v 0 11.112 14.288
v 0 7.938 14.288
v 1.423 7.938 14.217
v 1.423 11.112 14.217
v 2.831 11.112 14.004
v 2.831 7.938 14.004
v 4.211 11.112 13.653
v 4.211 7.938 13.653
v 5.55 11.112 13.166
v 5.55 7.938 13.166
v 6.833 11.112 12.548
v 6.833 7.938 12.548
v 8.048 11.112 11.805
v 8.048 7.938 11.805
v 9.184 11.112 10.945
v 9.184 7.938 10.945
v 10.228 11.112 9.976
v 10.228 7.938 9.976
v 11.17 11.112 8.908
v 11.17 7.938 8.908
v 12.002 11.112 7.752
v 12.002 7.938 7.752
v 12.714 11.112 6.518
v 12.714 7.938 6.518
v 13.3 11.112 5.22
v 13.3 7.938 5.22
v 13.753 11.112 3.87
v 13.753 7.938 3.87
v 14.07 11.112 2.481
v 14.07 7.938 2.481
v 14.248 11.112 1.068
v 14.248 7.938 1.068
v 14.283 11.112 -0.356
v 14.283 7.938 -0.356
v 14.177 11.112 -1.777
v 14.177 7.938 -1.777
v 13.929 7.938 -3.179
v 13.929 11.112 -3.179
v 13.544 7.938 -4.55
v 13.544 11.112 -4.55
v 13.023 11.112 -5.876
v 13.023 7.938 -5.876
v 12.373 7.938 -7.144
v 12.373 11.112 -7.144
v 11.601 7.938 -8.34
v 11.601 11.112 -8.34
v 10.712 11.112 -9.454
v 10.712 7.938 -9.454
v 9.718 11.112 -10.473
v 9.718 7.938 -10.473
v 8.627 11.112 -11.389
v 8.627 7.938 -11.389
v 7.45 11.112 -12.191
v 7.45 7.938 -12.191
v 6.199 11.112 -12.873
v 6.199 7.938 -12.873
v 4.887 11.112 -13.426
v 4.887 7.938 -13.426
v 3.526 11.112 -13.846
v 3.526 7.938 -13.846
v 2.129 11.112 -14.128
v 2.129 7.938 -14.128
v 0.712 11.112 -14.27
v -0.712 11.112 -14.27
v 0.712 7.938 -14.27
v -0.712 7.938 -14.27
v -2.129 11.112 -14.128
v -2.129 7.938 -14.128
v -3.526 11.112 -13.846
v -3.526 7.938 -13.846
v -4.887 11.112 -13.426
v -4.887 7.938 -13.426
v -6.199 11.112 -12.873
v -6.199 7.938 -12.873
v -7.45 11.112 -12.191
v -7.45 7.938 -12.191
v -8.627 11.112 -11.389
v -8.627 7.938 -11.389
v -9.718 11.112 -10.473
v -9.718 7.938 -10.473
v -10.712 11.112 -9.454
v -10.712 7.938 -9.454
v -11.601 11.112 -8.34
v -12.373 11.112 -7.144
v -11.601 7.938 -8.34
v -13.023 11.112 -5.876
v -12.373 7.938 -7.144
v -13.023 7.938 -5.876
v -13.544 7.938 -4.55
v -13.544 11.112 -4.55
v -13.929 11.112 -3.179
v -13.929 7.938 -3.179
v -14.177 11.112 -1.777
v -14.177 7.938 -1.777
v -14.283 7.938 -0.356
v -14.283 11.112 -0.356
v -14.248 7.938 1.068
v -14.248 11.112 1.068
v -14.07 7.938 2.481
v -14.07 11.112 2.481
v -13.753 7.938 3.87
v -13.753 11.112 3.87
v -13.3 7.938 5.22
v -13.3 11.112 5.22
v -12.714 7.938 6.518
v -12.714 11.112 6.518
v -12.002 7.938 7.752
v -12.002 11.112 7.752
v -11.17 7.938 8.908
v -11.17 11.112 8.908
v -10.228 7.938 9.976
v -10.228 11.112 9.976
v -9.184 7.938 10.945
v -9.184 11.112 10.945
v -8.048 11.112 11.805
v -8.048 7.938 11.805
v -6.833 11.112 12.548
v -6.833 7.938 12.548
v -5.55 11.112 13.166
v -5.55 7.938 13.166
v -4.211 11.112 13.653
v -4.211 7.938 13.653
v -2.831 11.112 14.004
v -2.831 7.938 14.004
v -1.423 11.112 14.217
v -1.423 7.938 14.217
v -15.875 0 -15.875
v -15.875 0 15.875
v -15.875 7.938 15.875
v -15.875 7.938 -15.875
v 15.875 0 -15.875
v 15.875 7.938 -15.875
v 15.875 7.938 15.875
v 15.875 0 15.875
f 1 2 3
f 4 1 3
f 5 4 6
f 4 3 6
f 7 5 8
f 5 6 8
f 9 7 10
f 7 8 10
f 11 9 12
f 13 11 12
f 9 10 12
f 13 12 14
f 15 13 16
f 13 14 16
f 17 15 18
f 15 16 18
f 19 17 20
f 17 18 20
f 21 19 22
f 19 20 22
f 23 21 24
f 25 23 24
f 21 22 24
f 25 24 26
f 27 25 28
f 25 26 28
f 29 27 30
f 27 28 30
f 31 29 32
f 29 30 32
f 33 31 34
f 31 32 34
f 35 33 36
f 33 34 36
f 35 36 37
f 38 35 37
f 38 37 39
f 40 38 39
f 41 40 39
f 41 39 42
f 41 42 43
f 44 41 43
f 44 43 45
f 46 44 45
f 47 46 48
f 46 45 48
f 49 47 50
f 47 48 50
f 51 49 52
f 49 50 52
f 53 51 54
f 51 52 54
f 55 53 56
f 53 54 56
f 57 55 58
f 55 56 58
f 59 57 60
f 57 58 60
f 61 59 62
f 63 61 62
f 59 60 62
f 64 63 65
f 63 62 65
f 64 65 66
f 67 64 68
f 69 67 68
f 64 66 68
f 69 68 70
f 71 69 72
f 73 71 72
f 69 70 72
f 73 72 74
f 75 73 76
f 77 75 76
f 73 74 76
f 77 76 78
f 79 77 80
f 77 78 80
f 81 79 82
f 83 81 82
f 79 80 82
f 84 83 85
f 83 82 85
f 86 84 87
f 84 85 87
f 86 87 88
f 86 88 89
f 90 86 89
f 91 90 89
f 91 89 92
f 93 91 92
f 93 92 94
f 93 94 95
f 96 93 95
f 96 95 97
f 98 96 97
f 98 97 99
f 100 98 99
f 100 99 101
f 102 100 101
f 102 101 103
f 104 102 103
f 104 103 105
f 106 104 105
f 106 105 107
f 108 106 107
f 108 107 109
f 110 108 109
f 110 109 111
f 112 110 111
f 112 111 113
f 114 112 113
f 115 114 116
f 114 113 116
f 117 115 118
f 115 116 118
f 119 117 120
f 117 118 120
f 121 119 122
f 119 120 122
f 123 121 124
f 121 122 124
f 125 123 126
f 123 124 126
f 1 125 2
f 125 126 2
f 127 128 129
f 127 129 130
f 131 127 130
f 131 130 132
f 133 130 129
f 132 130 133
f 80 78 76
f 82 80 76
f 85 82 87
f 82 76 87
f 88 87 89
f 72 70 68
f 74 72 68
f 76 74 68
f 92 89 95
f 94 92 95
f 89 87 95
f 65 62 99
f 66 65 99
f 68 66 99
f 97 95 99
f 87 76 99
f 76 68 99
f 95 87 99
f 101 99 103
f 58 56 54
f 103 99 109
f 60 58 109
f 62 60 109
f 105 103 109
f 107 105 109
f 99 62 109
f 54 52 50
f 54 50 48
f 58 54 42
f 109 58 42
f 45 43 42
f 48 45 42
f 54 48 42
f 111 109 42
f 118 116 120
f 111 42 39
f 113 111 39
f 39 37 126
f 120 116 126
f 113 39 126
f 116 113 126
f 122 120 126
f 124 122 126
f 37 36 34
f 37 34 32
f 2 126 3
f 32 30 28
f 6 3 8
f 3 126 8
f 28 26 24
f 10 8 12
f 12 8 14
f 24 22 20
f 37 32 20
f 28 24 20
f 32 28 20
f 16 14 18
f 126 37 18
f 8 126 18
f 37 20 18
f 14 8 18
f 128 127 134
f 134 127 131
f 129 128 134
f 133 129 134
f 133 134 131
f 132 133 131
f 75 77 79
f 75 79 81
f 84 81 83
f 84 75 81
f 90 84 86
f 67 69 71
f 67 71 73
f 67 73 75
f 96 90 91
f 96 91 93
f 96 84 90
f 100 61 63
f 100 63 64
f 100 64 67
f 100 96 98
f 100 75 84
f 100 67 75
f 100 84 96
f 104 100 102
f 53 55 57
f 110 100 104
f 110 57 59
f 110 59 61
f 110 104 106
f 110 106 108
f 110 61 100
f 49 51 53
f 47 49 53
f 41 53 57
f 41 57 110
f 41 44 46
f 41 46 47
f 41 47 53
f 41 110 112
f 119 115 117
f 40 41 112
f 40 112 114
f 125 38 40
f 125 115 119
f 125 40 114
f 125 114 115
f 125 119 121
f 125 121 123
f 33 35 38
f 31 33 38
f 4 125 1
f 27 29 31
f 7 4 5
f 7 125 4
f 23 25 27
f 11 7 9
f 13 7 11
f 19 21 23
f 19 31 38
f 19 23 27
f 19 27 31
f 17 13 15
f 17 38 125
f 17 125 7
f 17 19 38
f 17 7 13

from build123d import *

# Parameters (mm, degrees)
SKETCH2_W           = 31.75
SKETCH2_H           = 31.75
BOSS_EXTRUDE1_DEPTH = 7.9375
SKETCH3_R           = 14.2875
BOSS_EXTRUDE2_DEPTH = 3.175


with BuildPart() as part:
    # Sketch2 → Boss-Extrude1 (new body)
    with BuildSketch(Plane(origin=(0, 0, 0), x_dir=(1, 0, 0), z_dir=(0, 1, 0))):
        Rectangle(SKETCH2_W, SKETCH2_H)
    extrude(amount=BOSS_EXTRUDE1_DEPTH)


with BuildPart() as body_2:
    # Sketch3 → Boss-Extrude2 (new body)
    with BuildSketch(Plane(origin=(0, 7.9375, 0), x_dir=(1, 0, 0), z_dir=(0, 1, 0))):
        with Locations(Location((0, 0, 0), (0, 0, 270))):
            Circle(SKETCH3_R)
    extrude(amount=BOSS_EXTRUDE2_DEPTH)


solid = Compound([part.part, body_2.part])
